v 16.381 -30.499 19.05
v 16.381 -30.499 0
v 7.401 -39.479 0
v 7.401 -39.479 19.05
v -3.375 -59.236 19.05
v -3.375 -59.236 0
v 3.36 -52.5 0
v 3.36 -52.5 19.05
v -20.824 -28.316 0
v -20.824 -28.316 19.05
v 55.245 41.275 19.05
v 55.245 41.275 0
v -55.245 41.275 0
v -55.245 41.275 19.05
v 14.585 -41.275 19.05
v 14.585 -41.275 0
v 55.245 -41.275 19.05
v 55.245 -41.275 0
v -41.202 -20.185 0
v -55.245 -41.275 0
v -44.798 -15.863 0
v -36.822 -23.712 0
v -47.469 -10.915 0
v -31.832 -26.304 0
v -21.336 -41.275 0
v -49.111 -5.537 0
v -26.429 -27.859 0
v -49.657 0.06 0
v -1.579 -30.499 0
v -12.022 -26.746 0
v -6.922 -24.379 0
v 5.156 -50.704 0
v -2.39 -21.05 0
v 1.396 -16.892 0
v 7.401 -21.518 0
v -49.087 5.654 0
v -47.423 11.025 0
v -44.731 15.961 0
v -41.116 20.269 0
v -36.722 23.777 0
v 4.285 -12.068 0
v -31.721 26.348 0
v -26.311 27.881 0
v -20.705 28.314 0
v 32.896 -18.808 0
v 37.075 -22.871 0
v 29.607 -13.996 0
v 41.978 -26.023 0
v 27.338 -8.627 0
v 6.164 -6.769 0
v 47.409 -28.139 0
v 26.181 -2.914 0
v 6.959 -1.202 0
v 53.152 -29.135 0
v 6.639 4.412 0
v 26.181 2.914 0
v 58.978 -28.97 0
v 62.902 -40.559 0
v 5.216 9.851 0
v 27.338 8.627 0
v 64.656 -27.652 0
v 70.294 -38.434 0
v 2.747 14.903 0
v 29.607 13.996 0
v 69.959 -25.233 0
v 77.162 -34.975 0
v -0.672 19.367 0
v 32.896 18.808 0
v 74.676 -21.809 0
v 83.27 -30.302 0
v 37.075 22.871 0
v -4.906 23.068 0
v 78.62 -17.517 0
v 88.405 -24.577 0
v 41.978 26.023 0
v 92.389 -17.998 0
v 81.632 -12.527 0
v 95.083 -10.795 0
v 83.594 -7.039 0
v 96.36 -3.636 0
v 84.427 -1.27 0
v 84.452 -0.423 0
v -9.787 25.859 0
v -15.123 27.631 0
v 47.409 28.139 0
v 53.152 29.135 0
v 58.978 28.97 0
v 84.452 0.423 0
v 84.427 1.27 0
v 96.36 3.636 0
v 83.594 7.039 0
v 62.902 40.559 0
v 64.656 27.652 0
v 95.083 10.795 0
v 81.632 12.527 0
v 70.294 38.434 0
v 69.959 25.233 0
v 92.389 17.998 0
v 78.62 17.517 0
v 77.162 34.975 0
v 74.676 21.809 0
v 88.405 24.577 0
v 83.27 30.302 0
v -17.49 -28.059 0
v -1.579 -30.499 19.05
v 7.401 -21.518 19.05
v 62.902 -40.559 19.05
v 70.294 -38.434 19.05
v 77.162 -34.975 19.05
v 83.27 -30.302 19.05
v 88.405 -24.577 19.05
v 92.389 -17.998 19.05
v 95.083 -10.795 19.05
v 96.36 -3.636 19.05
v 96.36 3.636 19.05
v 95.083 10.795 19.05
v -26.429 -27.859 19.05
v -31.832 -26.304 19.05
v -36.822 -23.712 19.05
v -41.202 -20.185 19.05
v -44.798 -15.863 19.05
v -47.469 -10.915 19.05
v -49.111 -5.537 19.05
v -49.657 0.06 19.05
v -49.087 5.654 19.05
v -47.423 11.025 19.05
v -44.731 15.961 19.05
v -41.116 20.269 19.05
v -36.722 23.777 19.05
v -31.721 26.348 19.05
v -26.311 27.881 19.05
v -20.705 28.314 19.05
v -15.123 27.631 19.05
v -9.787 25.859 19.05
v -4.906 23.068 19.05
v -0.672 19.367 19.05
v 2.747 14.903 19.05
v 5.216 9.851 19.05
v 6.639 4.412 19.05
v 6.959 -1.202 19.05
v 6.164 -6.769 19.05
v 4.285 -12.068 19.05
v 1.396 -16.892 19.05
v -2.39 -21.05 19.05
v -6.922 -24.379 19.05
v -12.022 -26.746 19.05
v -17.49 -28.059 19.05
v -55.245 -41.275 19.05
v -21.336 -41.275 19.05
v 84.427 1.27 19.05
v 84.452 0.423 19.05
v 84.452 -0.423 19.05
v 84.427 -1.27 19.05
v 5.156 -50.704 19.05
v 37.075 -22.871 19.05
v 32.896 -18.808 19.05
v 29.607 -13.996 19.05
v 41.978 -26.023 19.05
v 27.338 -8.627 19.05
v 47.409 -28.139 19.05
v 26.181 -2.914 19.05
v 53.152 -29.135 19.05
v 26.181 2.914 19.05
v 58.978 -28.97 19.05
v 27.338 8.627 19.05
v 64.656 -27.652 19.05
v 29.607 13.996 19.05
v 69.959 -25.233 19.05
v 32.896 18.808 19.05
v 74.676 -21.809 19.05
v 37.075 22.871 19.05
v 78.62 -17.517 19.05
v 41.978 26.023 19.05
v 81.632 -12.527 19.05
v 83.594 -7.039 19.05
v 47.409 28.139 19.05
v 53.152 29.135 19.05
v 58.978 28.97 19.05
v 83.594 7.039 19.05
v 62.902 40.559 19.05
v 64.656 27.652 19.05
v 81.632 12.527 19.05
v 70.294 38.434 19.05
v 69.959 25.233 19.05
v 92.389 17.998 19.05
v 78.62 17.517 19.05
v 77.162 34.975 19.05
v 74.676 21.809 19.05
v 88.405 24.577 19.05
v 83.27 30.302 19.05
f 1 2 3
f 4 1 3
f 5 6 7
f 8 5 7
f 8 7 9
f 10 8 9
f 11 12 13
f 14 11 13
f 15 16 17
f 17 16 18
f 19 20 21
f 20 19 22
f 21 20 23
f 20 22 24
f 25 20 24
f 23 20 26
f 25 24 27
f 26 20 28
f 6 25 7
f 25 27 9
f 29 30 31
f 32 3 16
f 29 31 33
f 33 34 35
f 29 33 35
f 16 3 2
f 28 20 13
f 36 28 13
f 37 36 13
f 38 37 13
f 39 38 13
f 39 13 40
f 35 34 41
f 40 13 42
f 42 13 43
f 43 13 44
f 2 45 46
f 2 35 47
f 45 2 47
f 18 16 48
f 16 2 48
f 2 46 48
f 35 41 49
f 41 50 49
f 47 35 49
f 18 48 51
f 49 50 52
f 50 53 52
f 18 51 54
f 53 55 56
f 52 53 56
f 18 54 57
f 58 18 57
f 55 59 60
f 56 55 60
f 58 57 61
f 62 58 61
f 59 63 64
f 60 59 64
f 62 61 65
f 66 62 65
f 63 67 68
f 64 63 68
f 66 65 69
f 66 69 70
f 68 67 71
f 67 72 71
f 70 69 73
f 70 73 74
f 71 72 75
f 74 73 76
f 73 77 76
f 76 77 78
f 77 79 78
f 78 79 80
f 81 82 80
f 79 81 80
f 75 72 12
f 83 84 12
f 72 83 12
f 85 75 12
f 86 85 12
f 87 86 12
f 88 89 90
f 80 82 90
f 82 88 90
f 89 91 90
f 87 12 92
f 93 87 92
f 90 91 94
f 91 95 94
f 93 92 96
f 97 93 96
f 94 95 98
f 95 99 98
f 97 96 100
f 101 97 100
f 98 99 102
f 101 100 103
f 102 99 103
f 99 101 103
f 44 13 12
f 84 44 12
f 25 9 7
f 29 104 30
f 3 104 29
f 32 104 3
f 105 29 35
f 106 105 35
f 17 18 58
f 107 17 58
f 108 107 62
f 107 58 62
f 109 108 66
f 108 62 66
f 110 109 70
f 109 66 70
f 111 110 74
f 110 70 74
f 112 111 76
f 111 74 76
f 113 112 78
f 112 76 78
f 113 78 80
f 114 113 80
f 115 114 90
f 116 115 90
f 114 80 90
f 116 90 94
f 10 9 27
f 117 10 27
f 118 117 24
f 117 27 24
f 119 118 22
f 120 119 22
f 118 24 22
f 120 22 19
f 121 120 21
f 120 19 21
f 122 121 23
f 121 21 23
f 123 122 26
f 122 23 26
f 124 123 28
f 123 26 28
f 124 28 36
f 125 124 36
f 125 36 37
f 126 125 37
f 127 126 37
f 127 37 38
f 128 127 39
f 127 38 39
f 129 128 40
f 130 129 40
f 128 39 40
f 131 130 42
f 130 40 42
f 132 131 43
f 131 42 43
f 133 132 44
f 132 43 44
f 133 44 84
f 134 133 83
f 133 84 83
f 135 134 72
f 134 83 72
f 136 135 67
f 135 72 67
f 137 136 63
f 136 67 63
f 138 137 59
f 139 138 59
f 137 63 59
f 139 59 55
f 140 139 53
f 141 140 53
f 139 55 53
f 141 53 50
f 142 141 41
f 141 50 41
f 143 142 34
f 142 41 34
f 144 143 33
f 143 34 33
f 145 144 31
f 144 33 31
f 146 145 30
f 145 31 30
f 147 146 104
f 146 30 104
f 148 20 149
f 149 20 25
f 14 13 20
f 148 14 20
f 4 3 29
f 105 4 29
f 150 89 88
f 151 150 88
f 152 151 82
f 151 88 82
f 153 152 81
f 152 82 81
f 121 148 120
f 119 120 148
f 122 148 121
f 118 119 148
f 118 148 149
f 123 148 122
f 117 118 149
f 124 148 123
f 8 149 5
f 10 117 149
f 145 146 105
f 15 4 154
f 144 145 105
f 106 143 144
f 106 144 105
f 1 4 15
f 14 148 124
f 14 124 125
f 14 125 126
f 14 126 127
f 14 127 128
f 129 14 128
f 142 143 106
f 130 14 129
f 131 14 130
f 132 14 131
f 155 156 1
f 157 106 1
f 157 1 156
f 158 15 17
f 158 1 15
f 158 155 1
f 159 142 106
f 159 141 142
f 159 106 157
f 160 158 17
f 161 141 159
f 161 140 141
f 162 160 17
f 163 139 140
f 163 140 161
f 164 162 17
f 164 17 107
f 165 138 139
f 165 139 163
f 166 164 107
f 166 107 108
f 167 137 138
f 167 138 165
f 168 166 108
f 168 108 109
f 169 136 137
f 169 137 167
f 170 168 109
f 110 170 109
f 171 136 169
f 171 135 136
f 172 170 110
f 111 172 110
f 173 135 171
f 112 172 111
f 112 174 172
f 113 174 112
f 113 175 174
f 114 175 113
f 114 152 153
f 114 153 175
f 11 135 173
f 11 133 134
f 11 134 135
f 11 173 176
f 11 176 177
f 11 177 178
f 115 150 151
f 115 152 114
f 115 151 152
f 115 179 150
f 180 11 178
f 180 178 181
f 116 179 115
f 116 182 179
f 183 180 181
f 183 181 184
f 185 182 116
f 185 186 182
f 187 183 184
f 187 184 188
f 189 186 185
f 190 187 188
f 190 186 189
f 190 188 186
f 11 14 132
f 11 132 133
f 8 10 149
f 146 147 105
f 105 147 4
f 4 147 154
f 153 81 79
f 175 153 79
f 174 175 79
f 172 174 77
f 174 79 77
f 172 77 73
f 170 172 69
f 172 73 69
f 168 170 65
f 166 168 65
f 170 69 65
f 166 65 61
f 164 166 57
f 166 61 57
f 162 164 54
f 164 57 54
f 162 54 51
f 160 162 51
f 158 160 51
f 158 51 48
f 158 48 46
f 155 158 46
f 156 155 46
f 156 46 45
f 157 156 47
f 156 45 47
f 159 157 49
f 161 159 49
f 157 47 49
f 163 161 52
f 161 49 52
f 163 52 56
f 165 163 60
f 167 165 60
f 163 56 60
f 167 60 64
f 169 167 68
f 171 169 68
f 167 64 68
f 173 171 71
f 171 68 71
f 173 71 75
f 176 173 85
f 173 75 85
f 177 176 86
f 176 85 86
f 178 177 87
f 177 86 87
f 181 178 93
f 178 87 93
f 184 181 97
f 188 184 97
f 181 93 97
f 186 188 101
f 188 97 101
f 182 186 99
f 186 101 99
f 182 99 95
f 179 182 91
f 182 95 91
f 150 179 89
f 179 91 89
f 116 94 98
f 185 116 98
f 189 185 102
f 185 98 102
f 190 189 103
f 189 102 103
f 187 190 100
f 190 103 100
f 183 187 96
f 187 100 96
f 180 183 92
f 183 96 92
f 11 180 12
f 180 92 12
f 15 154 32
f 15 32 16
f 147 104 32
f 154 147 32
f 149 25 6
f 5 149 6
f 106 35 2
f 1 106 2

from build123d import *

# Parameters (mm, degrees)
F1_DEPTH = 19.05


with BuildPart() as f1:
    # F0 (on Top) → F1 (new body)
    with BuildSketch(Plane.XY):
        with BuildLine():
            ThreePointArc((95.083343, 10.795), (80.32549, 32.78101), (55.245, 41.275))
            Line((55.245, 41.275), (-55.245, 41.275))
            Line((-55.245, 41.275), (-55.245, -41.275))
            Line((-55.245, -41.275), (-21.336, -41.275))
            Line((-21.336, -41.275), (-7.865616, -41.275))
            Line((-7.865616, -41.275), (-20.82424, -28.316376))
            ThreePointArc((-20.82424, -28.316376), (-23.518744, 28.236761), (-17.489888, -28.058625))
            Line((-17.489888, -28.058625), (-4.273513, -41.275))
            Line((-4.273513, -41.275), (5.155756, -50.704269))
            Line((5.155756, -50.704269), (14.585024, -41.275))
            Line((14.585024, -41.275), (55.245, -41.275))
            ThreePointArc((55.245, -41.275), (80.32549, -32.78101), (95.083343, -10.795))
            ThreePointArc((95.083343, -10.795), (96.52, 0), (95.083343, 10.795))
        make_face()
        Polygon((16.381076, -30.498693), (7.40082, -39.478949), (-1.579437, -30.498693), (7.40082, -21.518437), align=None, mode=Mode.SUBTRACT)
        with BuildLine():
            ThreePointArc((84.427378, -1.27), (26.035, 0), (84.427378, 1.27))
            ThreePointArc((84.427378, 1.27), (84.455, 0), (84.427378, -1.27))
        make_face(mode=Mode.SUBTRACT)
        Polygon((-7.865616, -41.275), (-21.336, -41.275), (-3.375488, -59.235512), (3.359704, -52.50032), align=None)
    extrude(amount=F1_DEPTH)


solid = f1.part
